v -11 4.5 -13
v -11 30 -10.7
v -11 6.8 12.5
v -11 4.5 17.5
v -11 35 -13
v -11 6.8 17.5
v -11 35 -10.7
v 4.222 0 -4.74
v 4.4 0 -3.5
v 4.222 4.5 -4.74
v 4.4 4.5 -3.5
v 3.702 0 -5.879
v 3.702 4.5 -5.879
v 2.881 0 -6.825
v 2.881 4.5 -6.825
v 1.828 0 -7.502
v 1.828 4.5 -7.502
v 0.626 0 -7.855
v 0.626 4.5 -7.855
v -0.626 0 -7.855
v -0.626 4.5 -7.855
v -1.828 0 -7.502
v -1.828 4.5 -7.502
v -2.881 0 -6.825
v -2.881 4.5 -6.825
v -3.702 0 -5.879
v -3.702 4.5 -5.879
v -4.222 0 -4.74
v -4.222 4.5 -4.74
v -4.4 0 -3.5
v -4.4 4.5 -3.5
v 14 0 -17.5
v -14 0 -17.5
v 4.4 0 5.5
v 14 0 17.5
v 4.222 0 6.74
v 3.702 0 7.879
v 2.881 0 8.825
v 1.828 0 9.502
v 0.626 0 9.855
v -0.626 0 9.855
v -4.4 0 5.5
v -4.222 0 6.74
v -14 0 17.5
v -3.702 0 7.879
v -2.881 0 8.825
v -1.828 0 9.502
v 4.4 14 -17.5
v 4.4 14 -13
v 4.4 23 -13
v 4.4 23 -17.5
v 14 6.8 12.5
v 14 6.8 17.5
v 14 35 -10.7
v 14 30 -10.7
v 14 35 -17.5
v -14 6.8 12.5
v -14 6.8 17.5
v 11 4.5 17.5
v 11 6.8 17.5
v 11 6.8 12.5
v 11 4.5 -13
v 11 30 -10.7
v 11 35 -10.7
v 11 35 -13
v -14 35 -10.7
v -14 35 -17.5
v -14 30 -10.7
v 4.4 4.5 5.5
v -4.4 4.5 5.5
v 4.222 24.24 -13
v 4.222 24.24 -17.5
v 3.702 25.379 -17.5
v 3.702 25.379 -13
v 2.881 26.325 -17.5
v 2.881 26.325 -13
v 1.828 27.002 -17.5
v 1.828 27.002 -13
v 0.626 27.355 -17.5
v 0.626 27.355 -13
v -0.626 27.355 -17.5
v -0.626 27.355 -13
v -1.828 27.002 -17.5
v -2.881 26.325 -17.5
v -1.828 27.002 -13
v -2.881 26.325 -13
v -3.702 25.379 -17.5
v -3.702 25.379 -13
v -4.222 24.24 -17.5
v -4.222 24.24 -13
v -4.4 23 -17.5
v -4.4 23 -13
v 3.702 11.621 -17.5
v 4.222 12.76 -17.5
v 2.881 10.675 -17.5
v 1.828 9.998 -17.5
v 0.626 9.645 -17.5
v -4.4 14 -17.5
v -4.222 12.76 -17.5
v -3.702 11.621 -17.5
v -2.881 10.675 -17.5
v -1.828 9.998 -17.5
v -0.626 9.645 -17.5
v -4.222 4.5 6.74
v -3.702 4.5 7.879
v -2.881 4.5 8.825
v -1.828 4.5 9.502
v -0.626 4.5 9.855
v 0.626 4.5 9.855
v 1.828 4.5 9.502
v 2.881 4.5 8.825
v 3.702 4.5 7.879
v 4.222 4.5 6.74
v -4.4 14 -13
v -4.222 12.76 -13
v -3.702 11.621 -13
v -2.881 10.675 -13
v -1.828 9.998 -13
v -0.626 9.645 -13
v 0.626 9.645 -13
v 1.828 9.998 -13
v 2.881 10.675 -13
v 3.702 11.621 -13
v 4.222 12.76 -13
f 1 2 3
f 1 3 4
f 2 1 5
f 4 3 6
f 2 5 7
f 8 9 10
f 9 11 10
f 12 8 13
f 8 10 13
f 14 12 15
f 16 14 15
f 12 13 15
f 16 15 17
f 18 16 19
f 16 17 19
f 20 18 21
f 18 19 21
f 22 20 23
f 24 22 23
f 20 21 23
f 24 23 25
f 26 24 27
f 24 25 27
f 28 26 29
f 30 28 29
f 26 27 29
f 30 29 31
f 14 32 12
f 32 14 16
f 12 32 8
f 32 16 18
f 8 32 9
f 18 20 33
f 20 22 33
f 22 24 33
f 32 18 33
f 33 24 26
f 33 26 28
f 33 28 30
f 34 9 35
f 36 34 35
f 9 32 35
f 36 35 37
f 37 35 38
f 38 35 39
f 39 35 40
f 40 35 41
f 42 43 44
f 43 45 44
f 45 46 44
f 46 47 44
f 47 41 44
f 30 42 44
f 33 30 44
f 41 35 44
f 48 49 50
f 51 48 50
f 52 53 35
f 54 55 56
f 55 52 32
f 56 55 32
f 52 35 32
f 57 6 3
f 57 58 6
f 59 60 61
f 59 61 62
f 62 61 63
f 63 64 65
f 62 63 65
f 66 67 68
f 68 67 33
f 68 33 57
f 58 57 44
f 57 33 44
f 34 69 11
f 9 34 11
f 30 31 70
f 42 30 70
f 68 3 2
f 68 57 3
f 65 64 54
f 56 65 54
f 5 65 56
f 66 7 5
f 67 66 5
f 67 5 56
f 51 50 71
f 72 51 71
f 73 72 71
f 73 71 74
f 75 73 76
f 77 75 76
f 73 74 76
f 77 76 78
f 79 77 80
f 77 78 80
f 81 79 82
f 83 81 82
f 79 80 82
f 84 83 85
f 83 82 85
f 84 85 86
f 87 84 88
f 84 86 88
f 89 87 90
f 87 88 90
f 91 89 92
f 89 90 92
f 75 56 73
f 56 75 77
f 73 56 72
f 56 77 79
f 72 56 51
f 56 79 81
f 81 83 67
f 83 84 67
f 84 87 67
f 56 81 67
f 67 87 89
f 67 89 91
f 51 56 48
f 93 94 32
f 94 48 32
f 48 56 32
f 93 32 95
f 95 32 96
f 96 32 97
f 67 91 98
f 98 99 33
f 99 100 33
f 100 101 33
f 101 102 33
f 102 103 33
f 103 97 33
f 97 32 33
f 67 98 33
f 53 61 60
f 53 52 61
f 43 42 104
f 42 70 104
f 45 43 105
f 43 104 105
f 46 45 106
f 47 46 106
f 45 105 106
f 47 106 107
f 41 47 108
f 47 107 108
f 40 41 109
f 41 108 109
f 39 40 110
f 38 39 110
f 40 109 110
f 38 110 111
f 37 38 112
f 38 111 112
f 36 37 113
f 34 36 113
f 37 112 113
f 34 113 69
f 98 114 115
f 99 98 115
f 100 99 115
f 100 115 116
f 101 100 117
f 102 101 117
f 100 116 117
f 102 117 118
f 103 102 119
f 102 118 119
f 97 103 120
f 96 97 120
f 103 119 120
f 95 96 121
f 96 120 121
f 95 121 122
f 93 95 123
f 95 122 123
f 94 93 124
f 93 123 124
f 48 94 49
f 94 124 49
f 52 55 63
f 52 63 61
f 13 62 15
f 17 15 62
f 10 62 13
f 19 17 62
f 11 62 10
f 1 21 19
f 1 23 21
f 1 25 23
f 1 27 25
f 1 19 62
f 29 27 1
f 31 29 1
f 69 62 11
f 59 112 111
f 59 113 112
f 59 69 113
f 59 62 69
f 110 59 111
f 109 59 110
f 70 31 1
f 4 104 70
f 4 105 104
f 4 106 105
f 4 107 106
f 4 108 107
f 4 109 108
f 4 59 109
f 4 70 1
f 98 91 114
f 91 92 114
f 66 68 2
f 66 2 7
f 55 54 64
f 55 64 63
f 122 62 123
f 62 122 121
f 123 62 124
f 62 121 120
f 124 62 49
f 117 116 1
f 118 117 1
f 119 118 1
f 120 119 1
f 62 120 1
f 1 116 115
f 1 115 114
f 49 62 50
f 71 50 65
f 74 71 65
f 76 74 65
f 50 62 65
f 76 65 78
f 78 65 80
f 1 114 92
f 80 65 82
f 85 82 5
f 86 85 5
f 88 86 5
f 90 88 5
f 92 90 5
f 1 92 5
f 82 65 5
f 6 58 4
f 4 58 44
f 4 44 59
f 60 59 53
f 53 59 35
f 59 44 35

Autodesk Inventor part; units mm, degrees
ref_plane "YZ Plane" through (0, 0, 0) normal (1, 0, 0) x (0, 1, 0)
ref_plane "XZ Plane" through (0, 0, 0) normal (0, 1, 0) x (-1, 0, 0)
ref_plane "XY Plane" through (0, 0, 0) normal (0, 0, 1) x (1, 0, 0)
sketch "Sketch1" plane through (0, 0, 0) normal (0, 1, 0) x (-1, 0, 0)
  line L0 (14, 17.5) -> (-14, 17.5)
  line L1 (-14, 17.5) -> (-14, -17.5)
  line L2 (-14, -17.5) -> (14, -17.5)
  line L3 (14, -17.5) -> (14, 17.5)
  point P0 (0, 0)
  dimension "d0" = 35
  dimension "d1" = 28
  dimension "d2" = 14
  dimension "d3" = 17.5
extrude "Extrusion1" add sketch "Sketch1" along normal blind 4.5
sketch "Sketch2" plane through (14, 0, 17.5) normal (1, 0, 0) x (0, 0, -1)
  line L0 (0, 0) -> (35, 0) projected
  line L1 (35, 0) -> (35, 4.5) projected
  line L2 (0, 4.5) -> (35, 4.5) projected
  line L3 (0, 0) -> (0, 4.5) projected
  line L4 (35, 0) -> (35, 35)
  line L5 (35, 35) -> (28.2, 35)
  line L6 (28.2, 35) -> (28.2, 30)
  line L7 (28.2, 30) -> (5, 6.8)
  line L8 (5, 6.8) -> (0, 6.8)
  line L9 (0, 0) -> (35, 0) projected
  line L10 (0, 6.8) -> (0, 0)
  point P0 (17.5, 0)
  point P1 (0, 4.5)
  dimension "d6" = 6.8
  dimension "d7" = 5
extrude "Extrusion2" add sketch "Sketch2" against normal blind 3 contours L10 L8 L7 L6 L5 L4 L2
sketch "Sketch3" plane through (-14, 0, -17.5) normal (-1, 0, 0) x (0, 0, 1)
  line L0 (35, 4.5) -> (35, 6.8) projected
  line L1 (35, 6.8) -> (30, 6.8) projected
  line L2 (30, 6.8) -> (6.8, 30) projected
  line L3 (6.8, 30) -> (6.8, 35) projected
  line L4 (6.8, 35) -> (0, 35) projected
  line L5 (0, 35) -> (0, 4.5) projected
  line L6 (35, 4.5) -> (0, 4.5) projected
  line L7 (0, 0) -> (35, 0) projected
  line L8 (35, 0) -> (35, 4.5) projected
  line L9 (0, 4.5) -> (35, 4.5) projected
  line L10 (0, 0) -> (0, 4.5) projected
  point P0 (17.5, 0)
  point P1 (0, 4.5)
extrude "Extrusion3" add sketch "Sketch3" against normal blind 3
sketch "Sketch4" plane through (14, 0, -17.5) normal (0, 0, -1) x (-1, 0, 0)
  line L0 (3, 4.5) -> (25, 4.5) projected
  line L1 (3, 35) -> (3, 4.5) projected
  line L2 (0, 35) -> (3, 35) projected
  line L3 (0, 0) -> (0, 35) projected
  line L4 (0, 0) -> (28, 0) projected
  line L5 (28, 0) -> (28, 35) projected
  line L6 (28, 35) -> (25, 35) projected
  line L7 (25, 4.5) -> (25, 35) projected
  line L8 (0, 35) -> (3, 35) projected
  line L9 (28, 30) -> (28, 35) projected
  line L10 (0, 35) -> (28, 35)
  point P0 (14, 0)
  point P1 (25, 35)
extrude "Extrusion4" add sketch "Sketch4" against normal blind 4.5
sketch "Sketch5" plane through (0, 4.5, 0) normal (0, 1, 0) x (1, 0, 0)
  line L0 (14, -17.5) -> (14, 17.5) projected
  line L1 (-14, -17.5) -> (14, -17.5) projected
  line L2 (-14, 17.5) -> (-14, -17.5) projected
  line L3 (14, 17.5) -> (-14, 17.5) projected
  line L4 (11, 13) -> (-11, 13) projected
  line L5 (-11, 13) -> (-11, -17.5) projected
  line L6 (-11, -17.5) -> (11, -17.5) projected
  line L7 (11, -17.5) -> (11, 13) projected
  line L8 (0, 3.5) -> (0, -5.5) construction
  line L9 (-4.4, 3.5) -> (-4.4, -5.5)
  line L10 (4.4, -5.5) -> (4.4, 3.5)
  arc A0 (4.4, 3.5) -> (-4.4, 3.5) centre (0, 3.5) ccw
  arc A1 (-4.4, -5.5) -> (4.4, -5.5) centre (0, -5.5) ccw
  point P0 (0, 0)
  point P1 (0, -1)
  dimension "d14" = 14
  dimension "d15" = 9
  dimension "d16" = 8.8
extrude "Extrusion5" cut sketch "Sketch5" against normal through all contours A0 L10 A1 L9
sketch "Sketch6" plane through (14, 0, -13) normal (0, 0, 1) x (1, 0, 0)
  line L0 (-14, 23) -> (-14, 14) construction
  line L1 (-18.4, 23) -> (-18.4, 14)
  line L2 (-9.6, 14) -> (-9.6, 23)
  arc A0 (-9.6, 23) -> (-18.4, 23) centre (-14, 23) ccw
  arc A1 (-18.4, 14) -> (-9.6, 14) centre (-14, 14) ccw
  line L3 (-28, 0) -> (0, 0) projected
  line L4 (-14, 7.4113) -> (0, 7.4113) construction
  line L5 (0, 30) -> (0, 6.8) projected
  point P0 (-14, 0)
  point P1 (-14, 18.5)
  dimension "d19" = 9
  dimension "d20" = 8.8
  dimension "d21" = 14
  dimension "d22" = 14
extrude "Extrusion6" cut sketch "Sketch6" against normal blind 10
properties part number "3030_angle"
